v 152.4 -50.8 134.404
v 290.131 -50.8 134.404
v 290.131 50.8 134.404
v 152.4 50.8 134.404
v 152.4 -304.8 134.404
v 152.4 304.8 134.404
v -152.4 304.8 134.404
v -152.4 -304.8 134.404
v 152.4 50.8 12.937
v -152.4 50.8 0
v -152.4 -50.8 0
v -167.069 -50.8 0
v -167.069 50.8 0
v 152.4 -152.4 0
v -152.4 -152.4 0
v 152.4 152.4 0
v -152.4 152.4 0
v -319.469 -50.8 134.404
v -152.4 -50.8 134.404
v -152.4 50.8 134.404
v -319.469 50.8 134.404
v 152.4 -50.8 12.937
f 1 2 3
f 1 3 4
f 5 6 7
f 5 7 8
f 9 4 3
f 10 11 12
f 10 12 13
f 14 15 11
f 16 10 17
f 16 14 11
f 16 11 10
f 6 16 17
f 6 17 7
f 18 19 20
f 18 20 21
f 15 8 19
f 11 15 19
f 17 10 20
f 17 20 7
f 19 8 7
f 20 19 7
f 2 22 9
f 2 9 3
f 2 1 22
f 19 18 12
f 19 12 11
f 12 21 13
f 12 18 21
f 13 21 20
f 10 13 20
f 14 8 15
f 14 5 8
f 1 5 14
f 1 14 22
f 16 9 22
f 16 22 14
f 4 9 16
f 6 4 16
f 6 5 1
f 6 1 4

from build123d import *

# Parameters (mm, degrees)
F1_DEPTH = 50.8
F3_DEPTH = 152.4


with BuildPart() as f1:
    # F0 (on Front) → F1 (new body, symmetric)
    with BuildSketch(Plane.XZ):
        Polygon((0, 134.4041666021), (-319.4691668987, 134.4041666021), (-167.0691668987, 0), (0, 0), align=None)
        Polygon((290.1308331013, 134.4041666021), (0, 134.4041666021), (0, 0), (137.7308331013, 0), align=None)
    extrude(amount=F1_DEPTH, both=True)

    # F2 (on Right) → F3 (join, symmetric)
    with BuildSketch(Plane.YZ):
        Polygon((-152.4, 0), (0, 0), (0, 134.4041762), (-304.8, 134.4041762), align=None)
        Polygon((0, 134.4041762), (0, 0), (152.4, 0), (304.8, 134.4041762), align=None)
    extrude(amount=F3_DEPTH, both=True)


solid = f1.part
